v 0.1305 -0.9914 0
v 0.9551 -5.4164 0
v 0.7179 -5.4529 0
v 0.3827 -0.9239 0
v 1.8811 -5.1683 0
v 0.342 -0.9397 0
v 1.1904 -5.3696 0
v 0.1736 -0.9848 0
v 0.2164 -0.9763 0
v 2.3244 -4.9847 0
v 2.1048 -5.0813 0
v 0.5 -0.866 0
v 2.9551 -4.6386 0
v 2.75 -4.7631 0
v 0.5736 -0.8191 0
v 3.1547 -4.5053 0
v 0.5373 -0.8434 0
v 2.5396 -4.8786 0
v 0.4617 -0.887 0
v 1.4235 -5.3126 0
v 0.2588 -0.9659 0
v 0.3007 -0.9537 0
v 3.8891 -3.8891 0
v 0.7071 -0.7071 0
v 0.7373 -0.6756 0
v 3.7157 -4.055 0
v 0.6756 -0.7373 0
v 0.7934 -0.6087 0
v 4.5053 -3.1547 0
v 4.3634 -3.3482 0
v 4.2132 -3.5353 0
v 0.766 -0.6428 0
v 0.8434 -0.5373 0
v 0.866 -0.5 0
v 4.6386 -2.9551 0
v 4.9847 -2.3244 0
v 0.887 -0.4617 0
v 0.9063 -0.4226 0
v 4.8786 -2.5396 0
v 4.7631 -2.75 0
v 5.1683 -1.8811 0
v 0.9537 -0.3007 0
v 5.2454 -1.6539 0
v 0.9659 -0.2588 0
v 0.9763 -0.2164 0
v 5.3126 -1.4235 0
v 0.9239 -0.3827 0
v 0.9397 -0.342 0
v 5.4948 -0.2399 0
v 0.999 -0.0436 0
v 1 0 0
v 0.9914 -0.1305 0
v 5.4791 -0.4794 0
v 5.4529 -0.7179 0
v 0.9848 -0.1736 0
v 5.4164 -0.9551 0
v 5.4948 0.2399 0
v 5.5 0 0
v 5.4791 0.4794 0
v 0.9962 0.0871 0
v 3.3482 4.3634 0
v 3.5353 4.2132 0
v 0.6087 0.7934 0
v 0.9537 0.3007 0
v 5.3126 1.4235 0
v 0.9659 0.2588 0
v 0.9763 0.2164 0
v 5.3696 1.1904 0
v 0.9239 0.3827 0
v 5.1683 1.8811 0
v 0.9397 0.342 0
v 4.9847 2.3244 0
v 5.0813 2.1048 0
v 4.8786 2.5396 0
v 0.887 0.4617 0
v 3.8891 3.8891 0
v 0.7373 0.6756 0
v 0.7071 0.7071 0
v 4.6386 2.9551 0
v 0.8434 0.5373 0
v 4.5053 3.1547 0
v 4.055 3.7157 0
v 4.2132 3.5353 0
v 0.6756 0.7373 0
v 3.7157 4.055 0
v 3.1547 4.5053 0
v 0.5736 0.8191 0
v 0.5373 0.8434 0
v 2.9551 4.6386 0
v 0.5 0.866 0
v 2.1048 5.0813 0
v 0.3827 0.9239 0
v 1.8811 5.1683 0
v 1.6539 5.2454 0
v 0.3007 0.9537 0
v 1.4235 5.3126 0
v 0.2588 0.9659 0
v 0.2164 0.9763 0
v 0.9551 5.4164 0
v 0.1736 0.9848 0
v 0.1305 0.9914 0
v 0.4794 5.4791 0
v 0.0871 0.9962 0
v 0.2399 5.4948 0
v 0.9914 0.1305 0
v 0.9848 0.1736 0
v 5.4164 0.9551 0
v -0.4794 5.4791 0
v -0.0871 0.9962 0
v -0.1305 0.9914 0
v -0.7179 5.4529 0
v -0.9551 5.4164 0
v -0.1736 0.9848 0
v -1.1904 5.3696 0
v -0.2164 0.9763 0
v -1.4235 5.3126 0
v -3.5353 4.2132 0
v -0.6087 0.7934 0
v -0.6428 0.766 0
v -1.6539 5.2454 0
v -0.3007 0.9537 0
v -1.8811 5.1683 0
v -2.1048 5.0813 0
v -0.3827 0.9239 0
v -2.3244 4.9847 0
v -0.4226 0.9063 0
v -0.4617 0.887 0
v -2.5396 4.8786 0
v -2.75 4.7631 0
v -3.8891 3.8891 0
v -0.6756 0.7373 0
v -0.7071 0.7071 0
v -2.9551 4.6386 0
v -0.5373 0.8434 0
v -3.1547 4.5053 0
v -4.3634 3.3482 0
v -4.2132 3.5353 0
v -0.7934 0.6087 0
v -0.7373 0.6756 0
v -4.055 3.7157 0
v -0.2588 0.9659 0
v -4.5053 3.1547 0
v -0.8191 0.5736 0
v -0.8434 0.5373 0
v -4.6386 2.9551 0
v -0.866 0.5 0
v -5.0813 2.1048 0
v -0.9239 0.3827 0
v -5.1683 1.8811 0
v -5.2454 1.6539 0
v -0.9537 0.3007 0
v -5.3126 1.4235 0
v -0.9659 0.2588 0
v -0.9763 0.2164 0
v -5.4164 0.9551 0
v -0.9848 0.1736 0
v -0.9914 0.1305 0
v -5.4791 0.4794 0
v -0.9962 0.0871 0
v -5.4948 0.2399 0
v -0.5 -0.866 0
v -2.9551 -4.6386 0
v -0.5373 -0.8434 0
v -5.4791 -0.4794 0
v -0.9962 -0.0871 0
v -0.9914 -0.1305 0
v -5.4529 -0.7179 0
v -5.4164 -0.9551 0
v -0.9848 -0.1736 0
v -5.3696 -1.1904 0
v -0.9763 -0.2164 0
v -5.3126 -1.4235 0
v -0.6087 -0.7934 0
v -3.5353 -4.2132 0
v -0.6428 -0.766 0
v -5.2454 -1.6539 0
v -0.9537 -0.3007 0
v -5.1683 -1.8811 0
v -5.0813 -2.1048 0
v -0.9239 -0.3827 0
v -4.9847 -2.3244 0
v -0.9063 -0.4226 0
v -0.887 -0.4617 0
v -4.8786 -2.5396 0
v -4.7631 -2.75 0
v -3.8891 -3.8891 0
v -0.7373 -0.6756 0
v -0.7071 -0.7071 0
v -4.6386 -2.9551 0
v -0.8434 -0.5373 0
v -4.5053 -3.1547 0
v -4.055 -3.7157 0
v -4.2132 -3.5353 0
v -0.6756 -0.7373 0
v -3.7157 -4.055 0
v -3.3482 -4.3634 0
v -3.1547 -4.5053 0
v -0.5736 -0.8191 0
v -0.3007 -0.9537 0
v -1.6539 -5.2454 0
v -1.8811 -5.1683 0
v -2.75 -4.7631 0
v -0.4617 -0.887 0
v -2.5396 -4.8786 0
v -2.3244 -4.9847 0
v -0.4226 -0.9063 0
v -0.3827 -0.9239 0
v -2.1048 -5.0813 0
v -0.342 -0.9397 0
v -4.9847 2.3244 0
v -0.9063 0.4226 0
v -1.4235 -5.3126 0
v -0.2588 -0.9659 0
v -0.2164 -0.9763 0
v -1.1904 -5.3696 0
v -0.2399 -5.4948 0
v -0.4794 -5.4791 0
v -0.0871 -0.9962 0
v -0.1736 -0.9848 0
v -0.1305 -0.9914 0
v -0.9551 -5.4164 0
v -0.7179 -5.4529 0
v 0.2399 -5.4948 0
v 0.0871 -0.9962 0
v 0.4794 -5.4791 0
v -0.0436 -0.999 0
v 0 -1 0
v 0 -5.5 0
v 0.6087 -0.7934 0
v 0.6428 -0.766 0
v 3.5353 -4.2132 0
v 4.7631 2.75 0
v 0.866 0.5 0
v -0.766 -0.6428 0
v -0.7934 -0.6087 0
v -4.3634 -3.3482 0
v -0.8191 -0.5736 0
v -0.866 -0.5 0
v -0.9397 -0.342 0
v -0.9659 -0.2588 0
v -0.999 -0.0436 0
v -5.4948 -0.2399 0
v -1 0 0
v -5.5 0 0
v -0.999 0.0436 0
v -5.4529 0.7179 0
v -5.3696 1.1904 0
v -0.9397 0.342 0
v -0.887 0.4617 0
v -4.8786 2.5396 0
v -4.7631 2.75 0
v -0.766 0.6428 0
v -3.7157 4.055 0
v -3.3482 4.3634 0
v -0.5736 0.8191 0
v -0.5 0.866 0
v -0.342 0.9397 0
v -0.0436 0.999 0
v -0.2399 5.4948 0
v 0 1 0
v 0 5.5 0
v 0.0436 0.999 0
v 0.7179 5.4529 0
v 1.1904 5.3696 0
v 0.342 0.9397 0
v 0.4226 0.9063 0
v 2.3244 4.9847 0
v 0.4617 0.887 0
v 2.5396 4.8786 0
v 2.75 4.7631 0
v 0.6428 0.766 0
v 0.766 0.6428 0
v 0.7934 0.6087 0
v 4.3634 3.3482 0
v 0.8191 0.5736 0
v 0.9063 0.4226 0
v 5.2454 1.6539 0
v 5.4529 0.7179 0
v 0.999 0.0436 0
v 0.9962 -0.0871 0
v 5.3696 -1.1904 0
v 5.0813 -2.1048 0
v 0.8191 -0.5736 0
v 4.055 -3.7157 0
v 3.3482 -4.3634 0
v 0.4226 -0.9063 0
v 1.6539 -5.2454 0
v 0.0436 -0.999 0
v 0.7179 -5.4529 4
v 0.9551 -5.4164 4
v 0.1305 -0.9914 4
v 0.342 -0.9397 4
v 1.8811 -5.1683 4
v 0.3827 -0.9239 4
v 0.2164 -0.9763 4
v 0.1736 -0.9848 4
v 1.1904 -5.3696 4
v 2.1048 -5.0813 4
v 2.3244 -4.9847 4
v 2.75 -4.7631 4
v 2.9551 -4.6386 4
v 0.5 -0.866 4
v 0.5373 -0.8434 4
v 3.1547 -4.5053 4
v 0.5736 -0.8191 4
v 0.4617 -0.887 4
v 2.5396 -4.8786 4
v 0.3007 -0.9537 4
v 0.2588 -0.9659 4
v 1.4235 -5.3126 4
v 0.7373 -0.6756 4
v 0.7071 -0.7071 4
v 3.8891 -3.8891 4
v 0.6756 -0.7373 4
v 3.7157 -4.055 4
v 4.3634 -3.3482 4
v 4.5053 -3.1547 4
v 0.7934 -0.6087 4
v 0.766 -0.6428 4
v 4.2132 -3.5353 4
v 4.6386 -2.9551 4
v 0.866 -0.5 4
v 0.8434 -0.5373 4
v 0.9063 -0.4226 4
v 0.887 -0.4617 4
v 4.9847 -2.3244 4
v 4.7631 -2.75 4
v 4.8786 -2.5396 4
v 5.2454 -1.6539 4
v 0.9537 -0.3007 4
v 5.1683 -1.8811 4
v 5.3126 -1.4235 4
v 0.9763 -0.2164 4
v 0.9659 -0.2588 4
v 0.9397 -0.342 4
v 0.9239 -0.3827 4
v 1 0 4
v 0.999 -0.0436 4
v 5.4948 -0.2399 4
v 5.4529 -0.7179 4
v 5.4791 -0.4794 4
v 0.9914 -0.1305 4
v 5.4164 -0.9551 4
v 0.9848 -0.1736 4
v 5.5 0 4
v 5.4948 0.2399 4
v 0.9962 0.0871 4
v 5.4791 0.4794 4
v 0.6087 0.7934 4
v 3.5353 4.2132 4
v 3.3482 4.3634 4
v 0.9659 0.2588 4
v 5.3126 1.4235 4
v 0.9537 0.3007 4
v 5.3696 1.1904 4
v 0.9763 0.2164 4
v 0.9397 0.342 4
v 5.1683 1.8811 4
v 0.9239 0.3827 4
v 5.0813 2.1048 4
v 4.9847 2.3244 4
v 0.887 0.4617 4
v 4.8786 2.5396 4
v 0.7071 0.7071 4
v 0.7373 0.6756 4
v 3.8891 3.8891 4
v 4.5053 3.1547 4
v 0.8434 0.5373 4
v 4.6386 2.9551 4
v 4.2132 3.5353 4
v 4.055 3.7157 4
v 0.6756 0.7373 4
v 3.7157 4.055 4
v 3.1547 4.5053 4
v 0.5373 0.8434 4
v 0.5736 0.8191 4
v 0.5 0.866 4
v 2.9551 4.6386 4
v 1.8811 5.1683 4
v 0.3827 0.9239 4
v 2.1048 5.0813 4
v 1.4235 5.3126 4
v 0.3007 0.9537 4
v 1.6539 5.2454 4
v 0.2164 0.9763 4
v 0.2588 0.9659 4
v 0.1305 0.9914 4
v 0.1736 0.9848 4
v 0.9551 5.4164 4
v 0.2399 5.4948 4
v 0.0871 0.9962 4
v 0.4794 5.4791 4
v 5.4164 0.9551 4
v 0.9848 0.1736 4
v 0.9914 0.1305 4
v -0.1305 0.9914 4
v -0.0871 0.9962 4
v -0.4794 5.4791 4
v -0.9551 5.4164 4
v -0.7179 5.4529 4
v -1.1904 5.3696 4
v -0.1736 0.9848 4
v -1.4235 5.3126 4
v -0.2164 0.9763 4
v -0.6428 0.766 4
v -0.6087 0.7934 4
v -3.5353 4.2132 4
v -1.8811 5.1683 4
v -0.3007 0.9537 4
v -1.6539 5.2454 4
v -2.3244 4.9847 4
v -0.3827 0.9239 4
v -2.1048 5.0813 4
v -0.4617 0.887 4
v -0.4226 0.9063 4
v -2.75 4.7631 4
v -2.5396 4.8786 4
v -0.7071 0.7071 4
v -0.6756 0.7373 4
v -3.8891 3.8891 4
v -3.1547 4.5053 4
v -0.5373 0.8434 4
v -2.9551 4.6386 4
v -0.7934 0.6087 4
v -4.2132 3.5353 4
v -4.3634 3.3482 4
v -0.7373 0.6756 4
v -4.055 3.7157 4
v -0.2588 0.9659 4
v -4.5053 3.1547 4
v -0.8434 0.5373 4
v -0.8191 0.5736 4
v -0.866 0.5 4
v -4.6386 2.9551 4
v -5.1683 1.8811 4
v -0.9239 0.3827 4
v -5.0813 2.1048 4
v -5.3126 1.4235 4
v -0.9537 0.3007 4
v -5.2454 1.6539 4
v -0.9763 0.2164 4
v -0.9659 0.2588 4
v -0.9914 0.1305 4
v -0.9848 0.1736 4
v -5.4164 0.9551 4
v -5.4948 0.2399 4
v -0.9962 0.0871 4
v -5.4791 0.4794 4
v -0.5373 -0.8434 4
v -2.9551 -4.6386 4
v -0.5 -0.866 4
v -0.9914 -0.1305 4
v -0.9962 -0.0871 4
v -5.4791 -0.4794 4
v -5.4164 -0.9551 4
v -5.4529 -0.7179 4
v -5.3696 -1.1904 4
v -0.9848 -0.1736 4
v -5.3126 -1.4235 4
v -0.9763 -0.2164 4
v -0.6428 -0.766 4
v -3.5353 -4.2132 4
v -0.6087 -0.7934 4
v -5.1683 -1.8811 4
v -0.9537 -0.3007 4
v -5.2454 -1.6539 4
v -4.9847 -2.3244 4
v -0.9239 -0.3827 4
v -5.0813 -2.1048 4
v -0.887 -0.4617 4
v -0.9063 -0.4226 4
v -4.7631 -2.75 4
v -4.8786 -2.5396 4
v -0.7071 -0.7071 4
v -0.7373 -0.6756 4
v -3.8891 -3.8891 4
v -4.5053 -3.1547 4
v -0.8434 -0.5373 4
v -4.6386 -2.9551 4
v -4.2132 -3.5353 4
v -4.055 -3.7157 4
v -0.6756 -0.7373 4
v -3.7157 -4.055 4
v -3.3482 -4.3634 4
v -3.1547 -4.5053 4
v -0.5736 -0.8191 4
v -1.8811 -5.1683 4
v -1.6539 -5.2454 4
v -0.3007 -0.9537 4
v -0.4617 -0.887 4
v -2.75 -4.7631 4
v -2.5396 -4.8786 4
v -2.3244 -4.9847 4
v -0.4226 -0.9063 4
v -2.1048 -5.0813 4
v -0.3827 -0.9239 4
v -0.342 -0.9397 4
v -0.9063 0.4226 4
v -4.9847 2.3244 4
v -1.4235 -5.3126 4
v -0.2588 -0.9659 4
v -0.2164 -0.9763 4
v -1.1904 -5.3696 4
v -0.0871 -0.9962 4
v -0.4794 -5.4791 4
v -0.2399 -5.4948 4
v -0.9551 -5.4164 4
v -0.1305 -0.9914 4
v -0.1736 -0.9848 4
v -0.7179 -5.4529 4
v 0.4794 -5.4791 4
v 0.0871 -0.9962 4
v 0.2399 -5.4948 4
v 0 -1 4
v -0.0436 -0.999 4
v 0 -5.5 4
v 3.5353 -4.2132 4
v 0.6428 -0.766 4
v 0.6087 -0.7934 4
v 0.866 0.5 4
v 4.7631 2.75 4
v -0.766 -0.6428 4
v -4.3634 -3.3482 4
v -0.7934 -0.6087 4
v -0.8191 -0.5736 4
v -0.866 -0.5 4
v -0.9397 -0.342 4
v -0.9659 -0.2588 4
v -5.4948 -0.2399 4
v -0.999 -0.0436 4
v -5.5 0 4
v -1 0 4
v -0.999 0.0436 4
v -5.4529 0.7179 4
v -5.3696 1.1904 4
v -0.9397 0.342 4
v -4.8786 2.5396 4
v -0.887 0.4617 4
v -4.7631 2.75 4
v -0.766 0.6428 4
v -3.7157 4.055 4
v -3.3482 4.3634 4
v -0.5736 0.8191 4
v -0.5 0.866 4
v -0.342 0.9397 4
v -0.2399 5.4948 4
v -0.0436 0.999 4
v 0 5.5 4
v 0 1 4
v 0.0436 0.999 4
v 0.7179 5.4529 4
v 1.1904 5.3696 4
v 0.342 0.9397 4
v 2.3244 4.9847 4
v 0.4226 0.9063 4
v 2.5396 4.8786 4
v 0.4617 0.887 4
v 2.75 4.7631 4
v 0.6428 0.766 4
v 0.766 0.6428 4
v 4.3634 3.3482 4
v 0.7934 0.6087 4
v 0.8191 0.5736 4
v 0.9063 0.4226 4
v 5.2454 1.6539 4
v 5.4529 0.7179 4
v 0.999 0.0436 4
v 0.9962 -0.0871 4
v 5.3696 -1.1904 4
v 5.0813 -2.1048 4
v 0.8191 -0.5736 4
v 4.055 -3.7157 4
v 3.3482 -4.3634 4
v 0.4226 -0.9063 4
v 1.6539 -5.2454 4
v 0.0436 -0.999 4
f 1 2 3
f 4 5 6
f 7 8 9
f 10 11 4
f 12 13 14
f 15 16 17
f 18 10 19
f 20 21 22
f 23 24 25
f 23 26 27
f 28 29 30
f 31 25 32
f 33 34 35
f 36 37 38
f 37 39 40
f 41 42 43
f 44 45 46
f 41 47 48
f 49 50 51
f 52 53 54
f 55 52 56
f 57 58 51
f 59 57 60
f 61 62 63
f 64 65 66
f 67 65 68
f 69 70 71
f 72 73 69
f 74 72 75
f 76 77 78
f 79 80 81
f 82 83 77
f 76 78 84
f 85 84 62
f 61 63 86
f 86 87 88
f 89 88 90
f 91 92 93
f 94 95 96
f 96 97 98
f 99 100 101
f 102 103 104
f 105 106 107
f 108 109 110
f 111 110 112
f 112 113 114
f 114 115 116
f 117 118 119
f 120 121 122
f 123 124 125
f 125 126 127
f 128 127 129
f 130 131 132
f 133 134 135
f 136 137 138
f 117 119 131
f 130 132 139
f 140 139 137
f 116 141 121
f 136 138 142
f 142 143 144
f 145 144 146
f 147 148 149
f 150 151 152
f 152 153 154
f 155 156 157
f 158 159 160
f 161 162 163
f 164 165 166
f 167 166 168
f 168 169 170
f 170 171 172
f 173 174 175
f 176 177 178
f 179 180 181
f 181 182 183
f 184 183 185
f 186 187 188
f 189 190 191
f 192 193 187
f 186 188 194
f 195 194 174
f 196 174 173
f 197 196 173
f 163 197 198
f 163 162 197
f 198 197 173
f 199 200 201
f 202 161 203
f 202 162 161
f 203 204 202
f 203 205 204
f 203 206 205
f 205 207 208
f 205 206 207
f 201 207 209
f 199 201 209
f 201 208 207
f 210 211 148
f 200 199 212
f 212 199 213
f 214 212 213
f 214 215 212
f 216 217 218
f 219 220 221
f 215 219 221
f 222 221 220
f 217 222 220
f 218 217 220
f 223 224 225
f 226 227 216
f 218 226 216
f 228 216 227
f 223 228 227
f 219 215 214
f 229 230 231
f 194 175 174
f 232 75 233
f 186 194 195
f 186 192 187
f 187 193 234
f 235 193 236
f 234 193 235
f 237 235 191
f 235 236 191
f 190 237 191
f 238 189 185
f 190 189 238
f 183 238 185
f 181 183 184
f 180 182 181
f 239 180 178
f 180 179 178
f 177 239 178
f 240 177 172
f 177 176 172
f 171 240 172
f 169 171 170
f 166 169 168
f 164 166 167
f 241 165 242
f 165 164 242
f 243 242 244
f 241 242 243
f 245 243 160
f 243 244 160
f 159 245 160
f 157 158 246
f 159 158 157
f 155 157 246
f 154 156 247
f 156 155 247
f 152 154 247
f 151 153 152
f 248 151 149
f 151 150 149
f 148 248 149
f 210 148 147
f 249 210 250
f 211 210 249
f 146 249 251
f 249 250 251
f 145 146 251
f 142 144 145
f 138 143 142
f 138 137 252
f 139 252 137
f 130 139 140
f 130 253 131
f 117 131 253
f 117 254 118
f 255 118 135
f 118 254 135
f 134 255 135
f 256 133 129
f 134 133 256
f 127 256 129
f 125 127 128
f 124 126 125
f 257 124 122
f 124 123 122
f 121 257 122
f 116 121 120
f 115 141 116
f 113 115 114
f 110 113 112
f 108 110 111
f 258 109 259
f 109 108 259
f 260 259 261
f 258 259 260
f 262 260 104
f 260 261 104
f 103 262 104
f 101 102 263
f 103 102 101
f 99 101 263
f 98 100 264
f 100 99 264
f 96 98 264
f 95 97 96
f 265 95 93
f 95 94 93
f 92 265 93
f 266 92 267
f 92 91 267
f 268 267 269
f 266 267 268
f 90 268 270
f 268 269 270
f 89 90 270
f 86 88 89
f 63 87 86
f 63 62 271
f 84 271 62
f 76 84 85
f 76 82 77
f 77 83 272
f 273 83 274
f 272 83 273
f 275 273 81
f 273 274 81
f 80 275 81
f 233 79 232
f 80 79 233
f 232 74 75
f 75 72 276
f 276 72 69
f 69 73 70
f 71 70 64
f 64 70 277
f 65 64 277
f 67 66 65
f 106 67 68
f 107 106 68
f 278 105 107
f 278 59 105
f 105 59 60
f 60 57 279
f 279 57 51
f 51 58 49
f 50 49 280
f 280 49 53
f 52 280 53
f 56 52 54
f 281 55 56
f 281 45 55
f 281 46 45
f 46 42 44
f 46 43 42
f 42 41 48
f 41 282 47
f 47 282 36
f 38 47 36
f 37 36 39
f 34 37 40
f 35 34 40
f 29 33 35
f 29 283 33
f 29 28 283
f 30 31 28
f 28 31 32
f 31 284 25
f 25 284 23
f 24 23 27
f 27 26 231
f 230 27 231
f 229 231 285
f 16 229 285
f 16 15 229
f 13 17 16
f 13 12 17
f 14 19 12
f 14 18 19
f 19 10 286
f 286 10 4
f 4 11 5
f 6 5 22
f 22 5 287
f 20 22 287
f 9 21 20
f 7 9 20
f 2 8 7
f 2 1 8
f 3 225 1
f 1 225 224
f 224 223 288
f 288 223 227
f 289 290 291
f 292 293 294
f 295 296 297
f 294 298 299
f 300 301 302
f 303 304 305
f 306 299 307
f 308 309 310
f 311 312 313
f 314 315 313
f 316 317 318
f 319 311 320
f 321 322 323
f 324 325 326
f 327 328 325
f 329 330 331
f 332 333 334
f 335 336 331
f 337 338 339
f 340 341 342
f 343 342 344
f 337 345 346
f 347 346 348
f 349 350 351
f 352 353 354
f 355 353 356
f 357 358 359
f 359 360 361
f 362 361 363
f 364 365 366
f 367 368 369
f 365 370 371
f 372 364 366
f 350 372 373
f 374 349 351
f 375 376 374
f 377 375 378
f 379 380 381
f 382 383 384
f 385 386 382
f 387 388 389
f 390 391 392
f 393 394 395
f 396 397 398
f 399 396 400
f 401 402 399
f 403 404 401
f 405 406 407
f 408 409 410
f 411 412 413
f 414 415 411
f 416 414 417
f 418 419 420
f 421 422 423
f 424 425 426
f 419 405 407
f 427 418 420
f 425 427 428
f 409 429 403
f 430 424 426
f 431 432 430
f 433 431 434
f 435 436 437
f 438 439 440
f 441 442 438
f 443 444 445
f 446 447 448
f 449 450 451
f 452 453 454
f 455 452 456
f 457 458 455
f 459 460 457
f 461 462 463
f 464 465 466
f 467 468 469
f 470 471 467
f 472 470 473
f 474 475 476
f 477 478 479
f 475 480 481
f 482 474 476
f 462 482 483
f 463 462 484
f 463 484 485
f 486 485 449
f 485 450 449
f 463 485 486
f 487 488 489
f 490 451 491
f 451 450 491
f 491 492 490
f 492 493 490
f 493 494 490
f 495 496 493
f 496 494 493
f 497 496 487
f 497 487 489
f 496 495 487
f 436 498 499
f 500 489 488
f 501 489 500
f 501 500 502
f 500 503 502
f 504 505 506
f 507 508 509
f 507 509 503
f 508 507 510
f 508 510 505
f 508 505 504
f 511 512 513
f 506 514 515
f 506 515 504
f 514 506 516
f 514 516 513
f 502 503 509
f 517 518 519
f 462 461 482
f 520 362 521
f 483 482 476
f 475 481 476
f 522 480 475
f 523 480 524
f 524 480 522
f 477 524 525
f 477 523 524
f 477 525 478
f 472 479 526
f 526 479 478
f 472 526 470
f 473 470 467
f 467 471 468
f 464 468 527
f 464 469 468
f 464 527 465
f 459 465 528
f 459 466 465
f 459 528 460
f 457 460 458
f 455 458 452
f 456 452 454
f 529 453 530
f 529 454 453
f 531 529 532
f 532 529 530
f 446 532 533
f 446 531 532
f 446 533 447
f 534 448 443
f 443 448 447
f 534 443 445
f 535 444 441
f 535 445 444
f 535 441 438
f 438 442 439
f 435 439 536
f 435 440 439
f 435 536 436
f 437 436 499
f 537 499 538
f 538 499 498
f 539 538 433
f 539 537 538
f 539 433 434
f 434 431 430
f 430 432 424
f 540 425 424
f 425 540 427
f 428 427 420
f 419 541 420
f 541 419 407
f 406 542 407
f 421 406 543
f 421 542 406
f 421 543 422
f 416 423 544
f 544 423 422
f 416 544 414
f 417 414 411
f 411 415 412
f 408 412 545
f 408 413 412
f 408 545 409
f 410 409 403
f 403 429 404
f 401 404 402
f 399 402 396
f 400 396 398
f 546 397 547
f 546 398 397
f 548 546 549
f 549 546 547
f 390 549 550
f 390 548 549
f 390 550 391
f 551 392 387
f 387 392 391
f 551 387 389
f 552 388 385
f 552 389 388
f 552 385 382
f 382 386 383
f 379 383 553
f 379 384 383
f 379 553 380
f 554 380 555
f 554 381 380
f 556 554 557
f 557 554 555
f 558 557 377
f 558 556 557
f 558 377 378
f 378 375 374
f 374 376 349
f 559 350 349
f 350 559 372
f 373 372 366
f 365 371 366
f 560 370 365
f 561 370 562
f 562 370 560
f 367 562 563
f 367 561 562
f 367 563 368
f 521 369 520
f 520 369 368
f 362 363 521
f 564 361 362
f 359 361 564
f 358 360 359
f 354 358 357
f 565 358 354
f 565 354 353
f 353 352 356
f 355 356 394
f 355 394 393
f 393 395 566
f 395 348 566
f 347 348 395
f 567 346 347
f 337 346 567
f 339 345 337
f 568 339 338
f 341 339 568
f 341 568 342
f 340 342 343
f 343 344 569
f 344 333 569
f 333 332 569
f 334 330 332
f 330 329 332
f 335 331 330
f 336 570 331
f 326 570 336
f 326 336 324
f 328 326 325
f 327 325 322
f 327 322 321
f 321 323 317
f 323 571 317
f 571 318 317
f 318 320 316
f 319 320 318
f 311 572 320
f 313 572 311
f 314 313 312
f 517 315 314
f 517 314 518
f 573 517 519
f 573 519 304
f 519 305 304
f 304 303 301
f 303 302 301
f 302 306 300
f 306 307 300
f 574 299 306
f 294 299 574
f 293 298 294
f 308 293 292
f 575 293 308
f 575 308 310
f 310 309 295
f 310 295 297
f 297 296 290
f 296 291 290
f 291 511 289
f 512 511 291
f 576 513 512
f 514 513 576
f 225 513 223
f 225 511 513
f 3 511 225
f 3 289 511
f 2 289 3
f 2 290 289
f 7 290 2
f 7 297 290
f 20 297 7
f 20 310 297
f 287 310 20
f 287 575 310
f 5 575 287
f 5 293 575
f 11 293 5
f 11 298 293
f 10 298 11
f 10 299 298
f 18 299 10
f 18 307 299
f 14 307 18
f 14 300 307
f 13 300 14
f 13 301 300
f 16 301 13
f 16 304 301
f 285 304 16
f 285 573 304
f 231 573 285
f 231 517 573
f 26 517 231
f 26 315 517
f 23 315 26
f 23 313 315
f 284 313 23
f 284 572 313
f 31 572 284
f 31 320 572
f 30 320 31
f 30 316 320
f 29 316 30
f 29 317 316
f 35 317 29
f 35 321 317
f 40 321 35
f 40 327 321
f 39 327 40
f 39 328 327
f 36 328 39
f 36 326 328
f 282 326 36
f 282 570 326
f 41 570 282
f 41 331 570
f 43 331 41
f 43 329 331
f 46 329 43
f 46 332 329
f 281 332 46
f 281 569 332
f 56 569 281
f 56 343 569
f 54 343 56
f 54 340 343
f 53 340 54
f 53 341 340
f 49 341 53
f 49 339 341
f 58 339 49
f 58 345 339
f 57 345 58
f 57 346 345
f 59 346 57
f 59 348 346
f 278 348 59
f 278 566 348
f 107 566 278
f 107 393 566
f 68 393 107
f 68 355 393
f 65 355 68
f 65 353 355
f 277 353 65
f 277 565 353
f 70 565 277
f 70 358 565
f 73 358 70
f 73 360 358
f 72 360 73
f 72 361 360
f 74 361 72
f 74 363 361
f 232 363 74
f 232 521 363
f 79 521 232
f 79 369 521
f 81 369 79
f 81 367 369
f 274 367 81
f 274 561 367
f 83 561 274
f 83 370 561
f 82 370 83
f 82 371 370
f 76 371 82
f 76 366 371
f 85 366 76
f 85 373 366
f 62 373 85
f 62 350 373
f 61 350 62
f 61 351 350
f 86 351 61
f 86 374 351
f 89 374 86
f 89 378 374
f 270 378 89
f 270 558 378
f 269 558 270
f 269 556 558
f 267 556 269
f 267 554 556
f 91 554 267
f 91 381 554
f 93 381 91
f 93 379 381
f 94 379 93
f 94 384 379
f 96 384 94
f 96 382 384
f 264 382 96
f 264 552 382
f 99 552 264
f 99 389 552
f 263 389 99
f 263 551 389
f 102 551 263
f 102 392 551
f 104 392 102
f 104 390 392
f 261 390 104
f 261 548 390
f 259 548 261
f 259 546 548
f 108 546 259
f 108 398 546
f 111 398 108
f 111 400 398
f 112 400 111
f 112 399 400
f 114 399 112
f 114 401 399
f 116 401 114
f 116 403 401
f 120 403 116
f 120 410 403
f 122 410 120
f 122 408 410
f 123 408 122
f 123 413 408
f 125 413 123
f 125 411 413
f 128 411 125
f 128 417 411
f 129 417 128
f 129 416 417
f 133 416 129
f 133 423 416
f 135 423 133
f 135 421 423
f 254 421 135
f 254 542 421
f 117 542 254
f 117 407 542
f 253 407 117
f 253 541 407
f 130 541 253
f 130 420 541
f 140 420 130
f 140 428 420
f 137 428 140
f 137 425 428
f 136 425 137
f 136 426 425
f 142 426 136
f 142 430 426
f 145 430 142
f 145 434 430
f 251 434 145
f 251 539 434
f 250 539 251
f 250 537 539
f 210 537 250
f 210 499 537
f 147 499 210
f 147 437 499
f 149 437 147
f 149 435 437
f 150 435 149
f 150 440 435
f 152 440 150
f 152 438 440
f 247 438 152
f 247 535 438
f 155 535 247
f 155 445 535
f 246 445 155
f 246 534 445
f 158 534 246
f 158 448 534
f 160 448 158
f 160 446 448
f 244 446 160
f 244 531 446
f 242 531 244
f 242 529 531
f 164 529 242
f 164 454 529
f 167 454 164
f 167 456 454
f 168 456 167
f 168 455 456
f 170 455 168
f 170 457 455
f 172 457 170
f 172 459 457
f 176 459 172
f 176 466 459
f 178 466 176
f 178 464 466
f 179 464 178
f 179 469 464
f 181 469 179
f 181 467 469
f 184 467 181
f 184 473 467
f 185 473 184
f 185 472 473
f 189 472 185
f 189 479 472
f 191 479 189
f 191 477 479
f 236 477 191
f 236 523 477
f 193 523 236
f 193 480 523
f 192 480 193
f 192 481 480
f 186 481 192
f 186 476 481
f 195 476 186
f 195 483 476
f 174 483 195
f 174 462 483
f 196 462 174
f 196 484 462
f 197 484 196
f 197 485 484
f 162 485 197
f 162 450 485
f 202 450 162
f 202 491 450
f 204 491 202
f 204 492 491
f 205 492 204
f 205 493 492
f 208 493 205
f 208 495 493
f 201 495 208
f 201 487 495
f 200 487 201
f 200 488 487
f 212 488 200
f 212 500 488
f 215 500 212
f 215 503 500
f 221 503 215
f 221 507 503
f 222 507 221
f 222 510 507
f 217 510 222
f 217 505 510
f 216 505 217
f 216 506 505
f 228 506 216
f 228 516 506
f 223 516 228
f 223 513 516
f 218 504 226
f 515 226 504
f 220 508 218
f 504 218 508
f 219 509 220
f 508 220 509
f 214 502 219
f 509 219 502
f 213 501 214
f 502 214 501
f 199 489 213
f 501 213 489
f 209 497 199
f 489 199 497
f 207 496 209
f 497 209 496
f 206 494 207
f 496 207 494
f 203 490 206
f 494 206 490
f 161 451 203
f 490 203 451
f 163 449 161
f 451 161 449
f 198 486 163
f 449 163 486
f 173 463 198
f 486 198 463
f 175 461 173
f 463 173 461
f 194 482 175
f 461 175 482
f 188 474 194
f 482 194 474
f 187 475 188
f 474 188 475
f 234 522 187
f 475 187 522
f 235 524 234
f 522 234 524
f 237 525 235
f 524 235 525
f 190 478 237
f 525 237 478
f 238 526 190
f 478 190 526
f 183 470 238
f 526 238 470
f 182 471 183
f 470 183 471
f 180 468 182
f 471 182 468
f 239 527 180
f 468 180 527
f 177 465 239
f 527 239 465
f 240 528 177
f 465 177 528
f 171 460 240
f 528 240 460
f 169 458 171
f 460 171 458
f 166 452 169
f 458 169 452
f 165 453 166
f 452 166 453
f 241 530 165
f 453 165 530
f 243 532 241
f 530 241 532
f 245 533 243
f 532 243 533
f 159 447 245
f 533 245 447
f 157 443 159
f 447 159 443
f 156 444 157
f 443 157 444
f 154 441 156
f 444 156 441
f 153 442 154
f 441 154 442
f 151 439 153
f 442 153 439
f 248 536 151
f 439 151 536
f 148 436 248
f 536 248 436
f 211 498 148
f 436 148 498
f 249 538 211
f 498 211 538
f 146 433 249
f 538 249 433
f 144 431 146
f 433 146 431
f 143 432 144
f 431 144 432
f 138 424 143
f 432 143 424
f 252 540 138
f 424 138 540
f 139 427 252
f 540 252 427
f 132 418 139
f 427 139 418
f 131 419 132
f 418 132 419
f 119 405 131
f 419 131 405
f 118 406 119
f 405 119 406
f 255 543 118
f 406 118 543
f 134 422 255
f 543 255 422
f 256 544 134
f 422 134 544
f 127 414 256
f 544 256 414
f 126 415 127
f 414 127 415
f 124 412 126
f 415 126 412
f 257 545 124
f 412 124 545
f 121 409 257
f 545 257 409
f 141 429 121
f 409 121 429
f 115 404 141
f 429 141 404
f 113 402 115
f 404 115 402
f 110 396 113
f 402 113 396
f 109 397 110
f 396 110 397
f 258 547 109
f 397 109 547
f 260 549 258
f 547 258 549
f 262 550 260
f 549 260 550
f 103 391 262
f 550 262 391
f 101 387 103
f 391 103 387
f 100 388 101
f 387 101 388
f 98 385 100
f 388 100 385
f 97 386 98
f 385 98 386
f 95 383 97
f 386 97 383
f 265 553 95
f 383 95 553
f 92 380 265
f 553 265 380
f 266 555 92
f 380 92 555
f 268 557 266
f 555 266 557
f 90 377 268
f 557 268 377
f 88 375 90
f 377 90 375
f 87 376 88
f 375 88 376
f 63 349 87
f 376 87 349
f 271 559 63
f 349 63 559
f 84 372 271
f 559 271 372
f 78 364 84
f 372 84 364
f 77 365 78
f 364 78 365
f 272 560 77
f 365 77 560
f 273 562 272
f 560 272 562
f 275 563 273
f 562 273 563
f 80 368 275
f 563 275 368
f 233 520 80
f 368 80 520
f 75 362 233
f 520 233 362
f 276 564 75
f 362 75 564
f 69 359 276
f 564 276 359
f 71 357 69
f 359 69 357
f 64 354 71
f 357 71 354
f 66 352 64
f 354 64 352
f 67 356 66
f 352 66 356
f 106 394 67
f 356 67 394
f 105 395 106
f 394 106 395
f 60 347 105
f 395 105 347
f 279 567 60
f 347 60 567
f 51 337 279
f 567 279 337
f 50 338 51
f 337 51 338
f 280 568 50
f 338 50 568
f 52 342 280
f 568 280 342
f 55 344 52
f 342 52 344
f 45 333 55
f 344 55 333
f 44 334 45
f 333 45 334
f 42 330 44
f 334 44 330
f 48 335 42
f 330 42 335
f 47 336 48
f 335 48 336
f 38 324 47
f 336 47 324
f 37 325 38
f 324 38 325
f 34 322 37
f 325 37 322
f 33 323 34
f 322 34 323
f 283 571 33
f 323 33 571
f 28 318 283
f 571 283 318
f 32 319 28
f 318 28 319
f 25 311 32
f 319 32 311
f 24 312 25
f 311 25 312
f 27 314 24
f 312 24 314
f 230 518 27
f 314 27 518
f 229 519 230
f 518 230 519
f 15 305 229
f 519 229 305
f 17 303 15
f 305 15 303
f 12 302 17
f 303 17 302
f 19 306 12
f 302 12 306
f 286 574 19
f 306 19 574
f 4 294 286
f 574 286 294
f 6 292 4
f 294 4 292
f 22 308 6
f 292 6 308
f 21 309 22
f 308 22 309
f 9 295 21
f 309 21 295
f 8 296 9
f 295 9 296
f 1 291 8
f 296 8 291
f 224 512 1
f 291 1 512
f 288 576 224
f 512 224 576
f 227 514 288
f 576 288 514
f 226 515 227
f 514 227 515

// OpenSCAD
// file: ../print_fit.scad
// Print-fit clearances, shared by every printed part's `config="revised"`.
//
// A printed part comes off the machine slightly oversize, so a feature drawn
// line-to-line against what it mates with will not go together. Each mating
// feature is drawn at its mate's nominal size plus or minus one of two
// clearances, per side, chosen by what the mate is:
//
//     FIT_PRESS    a bought part the printed one is seated on, located by
//                  or bonded to: bearings, motors, splines, CF rods, tubes
//                  and strakes
//     FIT_SLIP     another printed part, and every fastener's clearance:
//                  screw holes, nut traps and pockets
//
// A third class is not a fit, because its surfaces never meet:
//
//     FIT_RUN      a gap between two parts that turn past each other and
//                  must never touch, such as a housing and a gear's teeth
//
// A fourth class is drawn under its mate's size, not over it:
//
//     FIT_TAP      a pilot a screw cuts its own thread into, drawn as
//                  fit_pin(the screw's nominal, FIT_TAP)
//
// The classes, their members and exclusions, and how a machine is qualified
// against these values are owned by specs/007.2 § Print fits; the coupon that
// qualifies them is 950-Tooling/fit_coupon.scad.
//
// Every part `include`s this file, so `-D FIT_SLIP=...` reaches a single
// render, and an edit here retunes every part. `config="previous"` draws at
// zero clearance: it is the reference mesh, and its dist gate measures it.

FIT_SLIP  = 0.15;
FIT_PRESS = 0.05;
FIT_RUN   = 0.50;
FIT_TAP   = 0.20;

// A hole or bore that takes a mate of diameter d, and a pin or shaft that
// goes into one, with clearance c per side.
function fit_bore(d, c) = d + 2 * c;
function fit_pin(d, c) = d - 2 * c;

// The clearances a part draws in configuration cfg: [slip, press, run, tap].
function fit_clearances(cfg) =
    cfg == "previous" ? [0, 0, 0, 0] : [FIT_SLIP, FIT_PRESS, FIT_RUN, FIT_TAP];
// main file
// #920-003 Finger Cap — parametric source.
// A plain washer-like disc: Ø11 × 4 with a Ø2 hole on its axis, for an M2 bolt.
//
//   config = "previous" — a faithful recreation of the reference mesh
//                         (../Reference/meshes/900-ToolInterface/920-003_FingerCap.stl), in that mesh's
//                         frame. There is no STEP or f3d of this part.
//   config = "revised"  — the same disc with H1 opened to the M2 bolt's slip clearance.
//
// FRAME. The reference's own: the axis on +Z through the origin, the underside at z = 0.
//
// Measured from the reference with scadmesh planes/radial/slice. The feature IDs are those of
// 920-003_FingerCap.view.json:
//
//     ID  feature  value    z span
//     D1  disc     Ø11.000  0 .. 4
//     H1  hole     Ø2.000   through
//
// FITS (revised). H1 takes an M2 bolt: fit_bore(2, FIT_SLIP) = Ø2.300.

include <../print_fit.scad>

/* [Configuration] */
// Parameter set: previous (reference) or revised
config = "previous"; // [previous, revised]
// What to draw: the part, or its 2D section for the outline gate
layer = "part"; // [part, D1]

/* [Hidden] */
$fn = 144;

DISC   = [11.000, 4.000];   // diameter, height
BOLT_D = 2.000;             // M2, the reference's H1

module section_2d(cfg = config)
    let(c = fit_clearances(cfg))
    difference() {
        circle(d = DISC[0]);
        circle(d = fit_bore(BOLT_D, c[0]));
    }

module finger_cap(cfg = config) linear_extrude(DISC[1]) section_2d(cfg);

if (layer == "D1") section_2d();
else finger_cap();
